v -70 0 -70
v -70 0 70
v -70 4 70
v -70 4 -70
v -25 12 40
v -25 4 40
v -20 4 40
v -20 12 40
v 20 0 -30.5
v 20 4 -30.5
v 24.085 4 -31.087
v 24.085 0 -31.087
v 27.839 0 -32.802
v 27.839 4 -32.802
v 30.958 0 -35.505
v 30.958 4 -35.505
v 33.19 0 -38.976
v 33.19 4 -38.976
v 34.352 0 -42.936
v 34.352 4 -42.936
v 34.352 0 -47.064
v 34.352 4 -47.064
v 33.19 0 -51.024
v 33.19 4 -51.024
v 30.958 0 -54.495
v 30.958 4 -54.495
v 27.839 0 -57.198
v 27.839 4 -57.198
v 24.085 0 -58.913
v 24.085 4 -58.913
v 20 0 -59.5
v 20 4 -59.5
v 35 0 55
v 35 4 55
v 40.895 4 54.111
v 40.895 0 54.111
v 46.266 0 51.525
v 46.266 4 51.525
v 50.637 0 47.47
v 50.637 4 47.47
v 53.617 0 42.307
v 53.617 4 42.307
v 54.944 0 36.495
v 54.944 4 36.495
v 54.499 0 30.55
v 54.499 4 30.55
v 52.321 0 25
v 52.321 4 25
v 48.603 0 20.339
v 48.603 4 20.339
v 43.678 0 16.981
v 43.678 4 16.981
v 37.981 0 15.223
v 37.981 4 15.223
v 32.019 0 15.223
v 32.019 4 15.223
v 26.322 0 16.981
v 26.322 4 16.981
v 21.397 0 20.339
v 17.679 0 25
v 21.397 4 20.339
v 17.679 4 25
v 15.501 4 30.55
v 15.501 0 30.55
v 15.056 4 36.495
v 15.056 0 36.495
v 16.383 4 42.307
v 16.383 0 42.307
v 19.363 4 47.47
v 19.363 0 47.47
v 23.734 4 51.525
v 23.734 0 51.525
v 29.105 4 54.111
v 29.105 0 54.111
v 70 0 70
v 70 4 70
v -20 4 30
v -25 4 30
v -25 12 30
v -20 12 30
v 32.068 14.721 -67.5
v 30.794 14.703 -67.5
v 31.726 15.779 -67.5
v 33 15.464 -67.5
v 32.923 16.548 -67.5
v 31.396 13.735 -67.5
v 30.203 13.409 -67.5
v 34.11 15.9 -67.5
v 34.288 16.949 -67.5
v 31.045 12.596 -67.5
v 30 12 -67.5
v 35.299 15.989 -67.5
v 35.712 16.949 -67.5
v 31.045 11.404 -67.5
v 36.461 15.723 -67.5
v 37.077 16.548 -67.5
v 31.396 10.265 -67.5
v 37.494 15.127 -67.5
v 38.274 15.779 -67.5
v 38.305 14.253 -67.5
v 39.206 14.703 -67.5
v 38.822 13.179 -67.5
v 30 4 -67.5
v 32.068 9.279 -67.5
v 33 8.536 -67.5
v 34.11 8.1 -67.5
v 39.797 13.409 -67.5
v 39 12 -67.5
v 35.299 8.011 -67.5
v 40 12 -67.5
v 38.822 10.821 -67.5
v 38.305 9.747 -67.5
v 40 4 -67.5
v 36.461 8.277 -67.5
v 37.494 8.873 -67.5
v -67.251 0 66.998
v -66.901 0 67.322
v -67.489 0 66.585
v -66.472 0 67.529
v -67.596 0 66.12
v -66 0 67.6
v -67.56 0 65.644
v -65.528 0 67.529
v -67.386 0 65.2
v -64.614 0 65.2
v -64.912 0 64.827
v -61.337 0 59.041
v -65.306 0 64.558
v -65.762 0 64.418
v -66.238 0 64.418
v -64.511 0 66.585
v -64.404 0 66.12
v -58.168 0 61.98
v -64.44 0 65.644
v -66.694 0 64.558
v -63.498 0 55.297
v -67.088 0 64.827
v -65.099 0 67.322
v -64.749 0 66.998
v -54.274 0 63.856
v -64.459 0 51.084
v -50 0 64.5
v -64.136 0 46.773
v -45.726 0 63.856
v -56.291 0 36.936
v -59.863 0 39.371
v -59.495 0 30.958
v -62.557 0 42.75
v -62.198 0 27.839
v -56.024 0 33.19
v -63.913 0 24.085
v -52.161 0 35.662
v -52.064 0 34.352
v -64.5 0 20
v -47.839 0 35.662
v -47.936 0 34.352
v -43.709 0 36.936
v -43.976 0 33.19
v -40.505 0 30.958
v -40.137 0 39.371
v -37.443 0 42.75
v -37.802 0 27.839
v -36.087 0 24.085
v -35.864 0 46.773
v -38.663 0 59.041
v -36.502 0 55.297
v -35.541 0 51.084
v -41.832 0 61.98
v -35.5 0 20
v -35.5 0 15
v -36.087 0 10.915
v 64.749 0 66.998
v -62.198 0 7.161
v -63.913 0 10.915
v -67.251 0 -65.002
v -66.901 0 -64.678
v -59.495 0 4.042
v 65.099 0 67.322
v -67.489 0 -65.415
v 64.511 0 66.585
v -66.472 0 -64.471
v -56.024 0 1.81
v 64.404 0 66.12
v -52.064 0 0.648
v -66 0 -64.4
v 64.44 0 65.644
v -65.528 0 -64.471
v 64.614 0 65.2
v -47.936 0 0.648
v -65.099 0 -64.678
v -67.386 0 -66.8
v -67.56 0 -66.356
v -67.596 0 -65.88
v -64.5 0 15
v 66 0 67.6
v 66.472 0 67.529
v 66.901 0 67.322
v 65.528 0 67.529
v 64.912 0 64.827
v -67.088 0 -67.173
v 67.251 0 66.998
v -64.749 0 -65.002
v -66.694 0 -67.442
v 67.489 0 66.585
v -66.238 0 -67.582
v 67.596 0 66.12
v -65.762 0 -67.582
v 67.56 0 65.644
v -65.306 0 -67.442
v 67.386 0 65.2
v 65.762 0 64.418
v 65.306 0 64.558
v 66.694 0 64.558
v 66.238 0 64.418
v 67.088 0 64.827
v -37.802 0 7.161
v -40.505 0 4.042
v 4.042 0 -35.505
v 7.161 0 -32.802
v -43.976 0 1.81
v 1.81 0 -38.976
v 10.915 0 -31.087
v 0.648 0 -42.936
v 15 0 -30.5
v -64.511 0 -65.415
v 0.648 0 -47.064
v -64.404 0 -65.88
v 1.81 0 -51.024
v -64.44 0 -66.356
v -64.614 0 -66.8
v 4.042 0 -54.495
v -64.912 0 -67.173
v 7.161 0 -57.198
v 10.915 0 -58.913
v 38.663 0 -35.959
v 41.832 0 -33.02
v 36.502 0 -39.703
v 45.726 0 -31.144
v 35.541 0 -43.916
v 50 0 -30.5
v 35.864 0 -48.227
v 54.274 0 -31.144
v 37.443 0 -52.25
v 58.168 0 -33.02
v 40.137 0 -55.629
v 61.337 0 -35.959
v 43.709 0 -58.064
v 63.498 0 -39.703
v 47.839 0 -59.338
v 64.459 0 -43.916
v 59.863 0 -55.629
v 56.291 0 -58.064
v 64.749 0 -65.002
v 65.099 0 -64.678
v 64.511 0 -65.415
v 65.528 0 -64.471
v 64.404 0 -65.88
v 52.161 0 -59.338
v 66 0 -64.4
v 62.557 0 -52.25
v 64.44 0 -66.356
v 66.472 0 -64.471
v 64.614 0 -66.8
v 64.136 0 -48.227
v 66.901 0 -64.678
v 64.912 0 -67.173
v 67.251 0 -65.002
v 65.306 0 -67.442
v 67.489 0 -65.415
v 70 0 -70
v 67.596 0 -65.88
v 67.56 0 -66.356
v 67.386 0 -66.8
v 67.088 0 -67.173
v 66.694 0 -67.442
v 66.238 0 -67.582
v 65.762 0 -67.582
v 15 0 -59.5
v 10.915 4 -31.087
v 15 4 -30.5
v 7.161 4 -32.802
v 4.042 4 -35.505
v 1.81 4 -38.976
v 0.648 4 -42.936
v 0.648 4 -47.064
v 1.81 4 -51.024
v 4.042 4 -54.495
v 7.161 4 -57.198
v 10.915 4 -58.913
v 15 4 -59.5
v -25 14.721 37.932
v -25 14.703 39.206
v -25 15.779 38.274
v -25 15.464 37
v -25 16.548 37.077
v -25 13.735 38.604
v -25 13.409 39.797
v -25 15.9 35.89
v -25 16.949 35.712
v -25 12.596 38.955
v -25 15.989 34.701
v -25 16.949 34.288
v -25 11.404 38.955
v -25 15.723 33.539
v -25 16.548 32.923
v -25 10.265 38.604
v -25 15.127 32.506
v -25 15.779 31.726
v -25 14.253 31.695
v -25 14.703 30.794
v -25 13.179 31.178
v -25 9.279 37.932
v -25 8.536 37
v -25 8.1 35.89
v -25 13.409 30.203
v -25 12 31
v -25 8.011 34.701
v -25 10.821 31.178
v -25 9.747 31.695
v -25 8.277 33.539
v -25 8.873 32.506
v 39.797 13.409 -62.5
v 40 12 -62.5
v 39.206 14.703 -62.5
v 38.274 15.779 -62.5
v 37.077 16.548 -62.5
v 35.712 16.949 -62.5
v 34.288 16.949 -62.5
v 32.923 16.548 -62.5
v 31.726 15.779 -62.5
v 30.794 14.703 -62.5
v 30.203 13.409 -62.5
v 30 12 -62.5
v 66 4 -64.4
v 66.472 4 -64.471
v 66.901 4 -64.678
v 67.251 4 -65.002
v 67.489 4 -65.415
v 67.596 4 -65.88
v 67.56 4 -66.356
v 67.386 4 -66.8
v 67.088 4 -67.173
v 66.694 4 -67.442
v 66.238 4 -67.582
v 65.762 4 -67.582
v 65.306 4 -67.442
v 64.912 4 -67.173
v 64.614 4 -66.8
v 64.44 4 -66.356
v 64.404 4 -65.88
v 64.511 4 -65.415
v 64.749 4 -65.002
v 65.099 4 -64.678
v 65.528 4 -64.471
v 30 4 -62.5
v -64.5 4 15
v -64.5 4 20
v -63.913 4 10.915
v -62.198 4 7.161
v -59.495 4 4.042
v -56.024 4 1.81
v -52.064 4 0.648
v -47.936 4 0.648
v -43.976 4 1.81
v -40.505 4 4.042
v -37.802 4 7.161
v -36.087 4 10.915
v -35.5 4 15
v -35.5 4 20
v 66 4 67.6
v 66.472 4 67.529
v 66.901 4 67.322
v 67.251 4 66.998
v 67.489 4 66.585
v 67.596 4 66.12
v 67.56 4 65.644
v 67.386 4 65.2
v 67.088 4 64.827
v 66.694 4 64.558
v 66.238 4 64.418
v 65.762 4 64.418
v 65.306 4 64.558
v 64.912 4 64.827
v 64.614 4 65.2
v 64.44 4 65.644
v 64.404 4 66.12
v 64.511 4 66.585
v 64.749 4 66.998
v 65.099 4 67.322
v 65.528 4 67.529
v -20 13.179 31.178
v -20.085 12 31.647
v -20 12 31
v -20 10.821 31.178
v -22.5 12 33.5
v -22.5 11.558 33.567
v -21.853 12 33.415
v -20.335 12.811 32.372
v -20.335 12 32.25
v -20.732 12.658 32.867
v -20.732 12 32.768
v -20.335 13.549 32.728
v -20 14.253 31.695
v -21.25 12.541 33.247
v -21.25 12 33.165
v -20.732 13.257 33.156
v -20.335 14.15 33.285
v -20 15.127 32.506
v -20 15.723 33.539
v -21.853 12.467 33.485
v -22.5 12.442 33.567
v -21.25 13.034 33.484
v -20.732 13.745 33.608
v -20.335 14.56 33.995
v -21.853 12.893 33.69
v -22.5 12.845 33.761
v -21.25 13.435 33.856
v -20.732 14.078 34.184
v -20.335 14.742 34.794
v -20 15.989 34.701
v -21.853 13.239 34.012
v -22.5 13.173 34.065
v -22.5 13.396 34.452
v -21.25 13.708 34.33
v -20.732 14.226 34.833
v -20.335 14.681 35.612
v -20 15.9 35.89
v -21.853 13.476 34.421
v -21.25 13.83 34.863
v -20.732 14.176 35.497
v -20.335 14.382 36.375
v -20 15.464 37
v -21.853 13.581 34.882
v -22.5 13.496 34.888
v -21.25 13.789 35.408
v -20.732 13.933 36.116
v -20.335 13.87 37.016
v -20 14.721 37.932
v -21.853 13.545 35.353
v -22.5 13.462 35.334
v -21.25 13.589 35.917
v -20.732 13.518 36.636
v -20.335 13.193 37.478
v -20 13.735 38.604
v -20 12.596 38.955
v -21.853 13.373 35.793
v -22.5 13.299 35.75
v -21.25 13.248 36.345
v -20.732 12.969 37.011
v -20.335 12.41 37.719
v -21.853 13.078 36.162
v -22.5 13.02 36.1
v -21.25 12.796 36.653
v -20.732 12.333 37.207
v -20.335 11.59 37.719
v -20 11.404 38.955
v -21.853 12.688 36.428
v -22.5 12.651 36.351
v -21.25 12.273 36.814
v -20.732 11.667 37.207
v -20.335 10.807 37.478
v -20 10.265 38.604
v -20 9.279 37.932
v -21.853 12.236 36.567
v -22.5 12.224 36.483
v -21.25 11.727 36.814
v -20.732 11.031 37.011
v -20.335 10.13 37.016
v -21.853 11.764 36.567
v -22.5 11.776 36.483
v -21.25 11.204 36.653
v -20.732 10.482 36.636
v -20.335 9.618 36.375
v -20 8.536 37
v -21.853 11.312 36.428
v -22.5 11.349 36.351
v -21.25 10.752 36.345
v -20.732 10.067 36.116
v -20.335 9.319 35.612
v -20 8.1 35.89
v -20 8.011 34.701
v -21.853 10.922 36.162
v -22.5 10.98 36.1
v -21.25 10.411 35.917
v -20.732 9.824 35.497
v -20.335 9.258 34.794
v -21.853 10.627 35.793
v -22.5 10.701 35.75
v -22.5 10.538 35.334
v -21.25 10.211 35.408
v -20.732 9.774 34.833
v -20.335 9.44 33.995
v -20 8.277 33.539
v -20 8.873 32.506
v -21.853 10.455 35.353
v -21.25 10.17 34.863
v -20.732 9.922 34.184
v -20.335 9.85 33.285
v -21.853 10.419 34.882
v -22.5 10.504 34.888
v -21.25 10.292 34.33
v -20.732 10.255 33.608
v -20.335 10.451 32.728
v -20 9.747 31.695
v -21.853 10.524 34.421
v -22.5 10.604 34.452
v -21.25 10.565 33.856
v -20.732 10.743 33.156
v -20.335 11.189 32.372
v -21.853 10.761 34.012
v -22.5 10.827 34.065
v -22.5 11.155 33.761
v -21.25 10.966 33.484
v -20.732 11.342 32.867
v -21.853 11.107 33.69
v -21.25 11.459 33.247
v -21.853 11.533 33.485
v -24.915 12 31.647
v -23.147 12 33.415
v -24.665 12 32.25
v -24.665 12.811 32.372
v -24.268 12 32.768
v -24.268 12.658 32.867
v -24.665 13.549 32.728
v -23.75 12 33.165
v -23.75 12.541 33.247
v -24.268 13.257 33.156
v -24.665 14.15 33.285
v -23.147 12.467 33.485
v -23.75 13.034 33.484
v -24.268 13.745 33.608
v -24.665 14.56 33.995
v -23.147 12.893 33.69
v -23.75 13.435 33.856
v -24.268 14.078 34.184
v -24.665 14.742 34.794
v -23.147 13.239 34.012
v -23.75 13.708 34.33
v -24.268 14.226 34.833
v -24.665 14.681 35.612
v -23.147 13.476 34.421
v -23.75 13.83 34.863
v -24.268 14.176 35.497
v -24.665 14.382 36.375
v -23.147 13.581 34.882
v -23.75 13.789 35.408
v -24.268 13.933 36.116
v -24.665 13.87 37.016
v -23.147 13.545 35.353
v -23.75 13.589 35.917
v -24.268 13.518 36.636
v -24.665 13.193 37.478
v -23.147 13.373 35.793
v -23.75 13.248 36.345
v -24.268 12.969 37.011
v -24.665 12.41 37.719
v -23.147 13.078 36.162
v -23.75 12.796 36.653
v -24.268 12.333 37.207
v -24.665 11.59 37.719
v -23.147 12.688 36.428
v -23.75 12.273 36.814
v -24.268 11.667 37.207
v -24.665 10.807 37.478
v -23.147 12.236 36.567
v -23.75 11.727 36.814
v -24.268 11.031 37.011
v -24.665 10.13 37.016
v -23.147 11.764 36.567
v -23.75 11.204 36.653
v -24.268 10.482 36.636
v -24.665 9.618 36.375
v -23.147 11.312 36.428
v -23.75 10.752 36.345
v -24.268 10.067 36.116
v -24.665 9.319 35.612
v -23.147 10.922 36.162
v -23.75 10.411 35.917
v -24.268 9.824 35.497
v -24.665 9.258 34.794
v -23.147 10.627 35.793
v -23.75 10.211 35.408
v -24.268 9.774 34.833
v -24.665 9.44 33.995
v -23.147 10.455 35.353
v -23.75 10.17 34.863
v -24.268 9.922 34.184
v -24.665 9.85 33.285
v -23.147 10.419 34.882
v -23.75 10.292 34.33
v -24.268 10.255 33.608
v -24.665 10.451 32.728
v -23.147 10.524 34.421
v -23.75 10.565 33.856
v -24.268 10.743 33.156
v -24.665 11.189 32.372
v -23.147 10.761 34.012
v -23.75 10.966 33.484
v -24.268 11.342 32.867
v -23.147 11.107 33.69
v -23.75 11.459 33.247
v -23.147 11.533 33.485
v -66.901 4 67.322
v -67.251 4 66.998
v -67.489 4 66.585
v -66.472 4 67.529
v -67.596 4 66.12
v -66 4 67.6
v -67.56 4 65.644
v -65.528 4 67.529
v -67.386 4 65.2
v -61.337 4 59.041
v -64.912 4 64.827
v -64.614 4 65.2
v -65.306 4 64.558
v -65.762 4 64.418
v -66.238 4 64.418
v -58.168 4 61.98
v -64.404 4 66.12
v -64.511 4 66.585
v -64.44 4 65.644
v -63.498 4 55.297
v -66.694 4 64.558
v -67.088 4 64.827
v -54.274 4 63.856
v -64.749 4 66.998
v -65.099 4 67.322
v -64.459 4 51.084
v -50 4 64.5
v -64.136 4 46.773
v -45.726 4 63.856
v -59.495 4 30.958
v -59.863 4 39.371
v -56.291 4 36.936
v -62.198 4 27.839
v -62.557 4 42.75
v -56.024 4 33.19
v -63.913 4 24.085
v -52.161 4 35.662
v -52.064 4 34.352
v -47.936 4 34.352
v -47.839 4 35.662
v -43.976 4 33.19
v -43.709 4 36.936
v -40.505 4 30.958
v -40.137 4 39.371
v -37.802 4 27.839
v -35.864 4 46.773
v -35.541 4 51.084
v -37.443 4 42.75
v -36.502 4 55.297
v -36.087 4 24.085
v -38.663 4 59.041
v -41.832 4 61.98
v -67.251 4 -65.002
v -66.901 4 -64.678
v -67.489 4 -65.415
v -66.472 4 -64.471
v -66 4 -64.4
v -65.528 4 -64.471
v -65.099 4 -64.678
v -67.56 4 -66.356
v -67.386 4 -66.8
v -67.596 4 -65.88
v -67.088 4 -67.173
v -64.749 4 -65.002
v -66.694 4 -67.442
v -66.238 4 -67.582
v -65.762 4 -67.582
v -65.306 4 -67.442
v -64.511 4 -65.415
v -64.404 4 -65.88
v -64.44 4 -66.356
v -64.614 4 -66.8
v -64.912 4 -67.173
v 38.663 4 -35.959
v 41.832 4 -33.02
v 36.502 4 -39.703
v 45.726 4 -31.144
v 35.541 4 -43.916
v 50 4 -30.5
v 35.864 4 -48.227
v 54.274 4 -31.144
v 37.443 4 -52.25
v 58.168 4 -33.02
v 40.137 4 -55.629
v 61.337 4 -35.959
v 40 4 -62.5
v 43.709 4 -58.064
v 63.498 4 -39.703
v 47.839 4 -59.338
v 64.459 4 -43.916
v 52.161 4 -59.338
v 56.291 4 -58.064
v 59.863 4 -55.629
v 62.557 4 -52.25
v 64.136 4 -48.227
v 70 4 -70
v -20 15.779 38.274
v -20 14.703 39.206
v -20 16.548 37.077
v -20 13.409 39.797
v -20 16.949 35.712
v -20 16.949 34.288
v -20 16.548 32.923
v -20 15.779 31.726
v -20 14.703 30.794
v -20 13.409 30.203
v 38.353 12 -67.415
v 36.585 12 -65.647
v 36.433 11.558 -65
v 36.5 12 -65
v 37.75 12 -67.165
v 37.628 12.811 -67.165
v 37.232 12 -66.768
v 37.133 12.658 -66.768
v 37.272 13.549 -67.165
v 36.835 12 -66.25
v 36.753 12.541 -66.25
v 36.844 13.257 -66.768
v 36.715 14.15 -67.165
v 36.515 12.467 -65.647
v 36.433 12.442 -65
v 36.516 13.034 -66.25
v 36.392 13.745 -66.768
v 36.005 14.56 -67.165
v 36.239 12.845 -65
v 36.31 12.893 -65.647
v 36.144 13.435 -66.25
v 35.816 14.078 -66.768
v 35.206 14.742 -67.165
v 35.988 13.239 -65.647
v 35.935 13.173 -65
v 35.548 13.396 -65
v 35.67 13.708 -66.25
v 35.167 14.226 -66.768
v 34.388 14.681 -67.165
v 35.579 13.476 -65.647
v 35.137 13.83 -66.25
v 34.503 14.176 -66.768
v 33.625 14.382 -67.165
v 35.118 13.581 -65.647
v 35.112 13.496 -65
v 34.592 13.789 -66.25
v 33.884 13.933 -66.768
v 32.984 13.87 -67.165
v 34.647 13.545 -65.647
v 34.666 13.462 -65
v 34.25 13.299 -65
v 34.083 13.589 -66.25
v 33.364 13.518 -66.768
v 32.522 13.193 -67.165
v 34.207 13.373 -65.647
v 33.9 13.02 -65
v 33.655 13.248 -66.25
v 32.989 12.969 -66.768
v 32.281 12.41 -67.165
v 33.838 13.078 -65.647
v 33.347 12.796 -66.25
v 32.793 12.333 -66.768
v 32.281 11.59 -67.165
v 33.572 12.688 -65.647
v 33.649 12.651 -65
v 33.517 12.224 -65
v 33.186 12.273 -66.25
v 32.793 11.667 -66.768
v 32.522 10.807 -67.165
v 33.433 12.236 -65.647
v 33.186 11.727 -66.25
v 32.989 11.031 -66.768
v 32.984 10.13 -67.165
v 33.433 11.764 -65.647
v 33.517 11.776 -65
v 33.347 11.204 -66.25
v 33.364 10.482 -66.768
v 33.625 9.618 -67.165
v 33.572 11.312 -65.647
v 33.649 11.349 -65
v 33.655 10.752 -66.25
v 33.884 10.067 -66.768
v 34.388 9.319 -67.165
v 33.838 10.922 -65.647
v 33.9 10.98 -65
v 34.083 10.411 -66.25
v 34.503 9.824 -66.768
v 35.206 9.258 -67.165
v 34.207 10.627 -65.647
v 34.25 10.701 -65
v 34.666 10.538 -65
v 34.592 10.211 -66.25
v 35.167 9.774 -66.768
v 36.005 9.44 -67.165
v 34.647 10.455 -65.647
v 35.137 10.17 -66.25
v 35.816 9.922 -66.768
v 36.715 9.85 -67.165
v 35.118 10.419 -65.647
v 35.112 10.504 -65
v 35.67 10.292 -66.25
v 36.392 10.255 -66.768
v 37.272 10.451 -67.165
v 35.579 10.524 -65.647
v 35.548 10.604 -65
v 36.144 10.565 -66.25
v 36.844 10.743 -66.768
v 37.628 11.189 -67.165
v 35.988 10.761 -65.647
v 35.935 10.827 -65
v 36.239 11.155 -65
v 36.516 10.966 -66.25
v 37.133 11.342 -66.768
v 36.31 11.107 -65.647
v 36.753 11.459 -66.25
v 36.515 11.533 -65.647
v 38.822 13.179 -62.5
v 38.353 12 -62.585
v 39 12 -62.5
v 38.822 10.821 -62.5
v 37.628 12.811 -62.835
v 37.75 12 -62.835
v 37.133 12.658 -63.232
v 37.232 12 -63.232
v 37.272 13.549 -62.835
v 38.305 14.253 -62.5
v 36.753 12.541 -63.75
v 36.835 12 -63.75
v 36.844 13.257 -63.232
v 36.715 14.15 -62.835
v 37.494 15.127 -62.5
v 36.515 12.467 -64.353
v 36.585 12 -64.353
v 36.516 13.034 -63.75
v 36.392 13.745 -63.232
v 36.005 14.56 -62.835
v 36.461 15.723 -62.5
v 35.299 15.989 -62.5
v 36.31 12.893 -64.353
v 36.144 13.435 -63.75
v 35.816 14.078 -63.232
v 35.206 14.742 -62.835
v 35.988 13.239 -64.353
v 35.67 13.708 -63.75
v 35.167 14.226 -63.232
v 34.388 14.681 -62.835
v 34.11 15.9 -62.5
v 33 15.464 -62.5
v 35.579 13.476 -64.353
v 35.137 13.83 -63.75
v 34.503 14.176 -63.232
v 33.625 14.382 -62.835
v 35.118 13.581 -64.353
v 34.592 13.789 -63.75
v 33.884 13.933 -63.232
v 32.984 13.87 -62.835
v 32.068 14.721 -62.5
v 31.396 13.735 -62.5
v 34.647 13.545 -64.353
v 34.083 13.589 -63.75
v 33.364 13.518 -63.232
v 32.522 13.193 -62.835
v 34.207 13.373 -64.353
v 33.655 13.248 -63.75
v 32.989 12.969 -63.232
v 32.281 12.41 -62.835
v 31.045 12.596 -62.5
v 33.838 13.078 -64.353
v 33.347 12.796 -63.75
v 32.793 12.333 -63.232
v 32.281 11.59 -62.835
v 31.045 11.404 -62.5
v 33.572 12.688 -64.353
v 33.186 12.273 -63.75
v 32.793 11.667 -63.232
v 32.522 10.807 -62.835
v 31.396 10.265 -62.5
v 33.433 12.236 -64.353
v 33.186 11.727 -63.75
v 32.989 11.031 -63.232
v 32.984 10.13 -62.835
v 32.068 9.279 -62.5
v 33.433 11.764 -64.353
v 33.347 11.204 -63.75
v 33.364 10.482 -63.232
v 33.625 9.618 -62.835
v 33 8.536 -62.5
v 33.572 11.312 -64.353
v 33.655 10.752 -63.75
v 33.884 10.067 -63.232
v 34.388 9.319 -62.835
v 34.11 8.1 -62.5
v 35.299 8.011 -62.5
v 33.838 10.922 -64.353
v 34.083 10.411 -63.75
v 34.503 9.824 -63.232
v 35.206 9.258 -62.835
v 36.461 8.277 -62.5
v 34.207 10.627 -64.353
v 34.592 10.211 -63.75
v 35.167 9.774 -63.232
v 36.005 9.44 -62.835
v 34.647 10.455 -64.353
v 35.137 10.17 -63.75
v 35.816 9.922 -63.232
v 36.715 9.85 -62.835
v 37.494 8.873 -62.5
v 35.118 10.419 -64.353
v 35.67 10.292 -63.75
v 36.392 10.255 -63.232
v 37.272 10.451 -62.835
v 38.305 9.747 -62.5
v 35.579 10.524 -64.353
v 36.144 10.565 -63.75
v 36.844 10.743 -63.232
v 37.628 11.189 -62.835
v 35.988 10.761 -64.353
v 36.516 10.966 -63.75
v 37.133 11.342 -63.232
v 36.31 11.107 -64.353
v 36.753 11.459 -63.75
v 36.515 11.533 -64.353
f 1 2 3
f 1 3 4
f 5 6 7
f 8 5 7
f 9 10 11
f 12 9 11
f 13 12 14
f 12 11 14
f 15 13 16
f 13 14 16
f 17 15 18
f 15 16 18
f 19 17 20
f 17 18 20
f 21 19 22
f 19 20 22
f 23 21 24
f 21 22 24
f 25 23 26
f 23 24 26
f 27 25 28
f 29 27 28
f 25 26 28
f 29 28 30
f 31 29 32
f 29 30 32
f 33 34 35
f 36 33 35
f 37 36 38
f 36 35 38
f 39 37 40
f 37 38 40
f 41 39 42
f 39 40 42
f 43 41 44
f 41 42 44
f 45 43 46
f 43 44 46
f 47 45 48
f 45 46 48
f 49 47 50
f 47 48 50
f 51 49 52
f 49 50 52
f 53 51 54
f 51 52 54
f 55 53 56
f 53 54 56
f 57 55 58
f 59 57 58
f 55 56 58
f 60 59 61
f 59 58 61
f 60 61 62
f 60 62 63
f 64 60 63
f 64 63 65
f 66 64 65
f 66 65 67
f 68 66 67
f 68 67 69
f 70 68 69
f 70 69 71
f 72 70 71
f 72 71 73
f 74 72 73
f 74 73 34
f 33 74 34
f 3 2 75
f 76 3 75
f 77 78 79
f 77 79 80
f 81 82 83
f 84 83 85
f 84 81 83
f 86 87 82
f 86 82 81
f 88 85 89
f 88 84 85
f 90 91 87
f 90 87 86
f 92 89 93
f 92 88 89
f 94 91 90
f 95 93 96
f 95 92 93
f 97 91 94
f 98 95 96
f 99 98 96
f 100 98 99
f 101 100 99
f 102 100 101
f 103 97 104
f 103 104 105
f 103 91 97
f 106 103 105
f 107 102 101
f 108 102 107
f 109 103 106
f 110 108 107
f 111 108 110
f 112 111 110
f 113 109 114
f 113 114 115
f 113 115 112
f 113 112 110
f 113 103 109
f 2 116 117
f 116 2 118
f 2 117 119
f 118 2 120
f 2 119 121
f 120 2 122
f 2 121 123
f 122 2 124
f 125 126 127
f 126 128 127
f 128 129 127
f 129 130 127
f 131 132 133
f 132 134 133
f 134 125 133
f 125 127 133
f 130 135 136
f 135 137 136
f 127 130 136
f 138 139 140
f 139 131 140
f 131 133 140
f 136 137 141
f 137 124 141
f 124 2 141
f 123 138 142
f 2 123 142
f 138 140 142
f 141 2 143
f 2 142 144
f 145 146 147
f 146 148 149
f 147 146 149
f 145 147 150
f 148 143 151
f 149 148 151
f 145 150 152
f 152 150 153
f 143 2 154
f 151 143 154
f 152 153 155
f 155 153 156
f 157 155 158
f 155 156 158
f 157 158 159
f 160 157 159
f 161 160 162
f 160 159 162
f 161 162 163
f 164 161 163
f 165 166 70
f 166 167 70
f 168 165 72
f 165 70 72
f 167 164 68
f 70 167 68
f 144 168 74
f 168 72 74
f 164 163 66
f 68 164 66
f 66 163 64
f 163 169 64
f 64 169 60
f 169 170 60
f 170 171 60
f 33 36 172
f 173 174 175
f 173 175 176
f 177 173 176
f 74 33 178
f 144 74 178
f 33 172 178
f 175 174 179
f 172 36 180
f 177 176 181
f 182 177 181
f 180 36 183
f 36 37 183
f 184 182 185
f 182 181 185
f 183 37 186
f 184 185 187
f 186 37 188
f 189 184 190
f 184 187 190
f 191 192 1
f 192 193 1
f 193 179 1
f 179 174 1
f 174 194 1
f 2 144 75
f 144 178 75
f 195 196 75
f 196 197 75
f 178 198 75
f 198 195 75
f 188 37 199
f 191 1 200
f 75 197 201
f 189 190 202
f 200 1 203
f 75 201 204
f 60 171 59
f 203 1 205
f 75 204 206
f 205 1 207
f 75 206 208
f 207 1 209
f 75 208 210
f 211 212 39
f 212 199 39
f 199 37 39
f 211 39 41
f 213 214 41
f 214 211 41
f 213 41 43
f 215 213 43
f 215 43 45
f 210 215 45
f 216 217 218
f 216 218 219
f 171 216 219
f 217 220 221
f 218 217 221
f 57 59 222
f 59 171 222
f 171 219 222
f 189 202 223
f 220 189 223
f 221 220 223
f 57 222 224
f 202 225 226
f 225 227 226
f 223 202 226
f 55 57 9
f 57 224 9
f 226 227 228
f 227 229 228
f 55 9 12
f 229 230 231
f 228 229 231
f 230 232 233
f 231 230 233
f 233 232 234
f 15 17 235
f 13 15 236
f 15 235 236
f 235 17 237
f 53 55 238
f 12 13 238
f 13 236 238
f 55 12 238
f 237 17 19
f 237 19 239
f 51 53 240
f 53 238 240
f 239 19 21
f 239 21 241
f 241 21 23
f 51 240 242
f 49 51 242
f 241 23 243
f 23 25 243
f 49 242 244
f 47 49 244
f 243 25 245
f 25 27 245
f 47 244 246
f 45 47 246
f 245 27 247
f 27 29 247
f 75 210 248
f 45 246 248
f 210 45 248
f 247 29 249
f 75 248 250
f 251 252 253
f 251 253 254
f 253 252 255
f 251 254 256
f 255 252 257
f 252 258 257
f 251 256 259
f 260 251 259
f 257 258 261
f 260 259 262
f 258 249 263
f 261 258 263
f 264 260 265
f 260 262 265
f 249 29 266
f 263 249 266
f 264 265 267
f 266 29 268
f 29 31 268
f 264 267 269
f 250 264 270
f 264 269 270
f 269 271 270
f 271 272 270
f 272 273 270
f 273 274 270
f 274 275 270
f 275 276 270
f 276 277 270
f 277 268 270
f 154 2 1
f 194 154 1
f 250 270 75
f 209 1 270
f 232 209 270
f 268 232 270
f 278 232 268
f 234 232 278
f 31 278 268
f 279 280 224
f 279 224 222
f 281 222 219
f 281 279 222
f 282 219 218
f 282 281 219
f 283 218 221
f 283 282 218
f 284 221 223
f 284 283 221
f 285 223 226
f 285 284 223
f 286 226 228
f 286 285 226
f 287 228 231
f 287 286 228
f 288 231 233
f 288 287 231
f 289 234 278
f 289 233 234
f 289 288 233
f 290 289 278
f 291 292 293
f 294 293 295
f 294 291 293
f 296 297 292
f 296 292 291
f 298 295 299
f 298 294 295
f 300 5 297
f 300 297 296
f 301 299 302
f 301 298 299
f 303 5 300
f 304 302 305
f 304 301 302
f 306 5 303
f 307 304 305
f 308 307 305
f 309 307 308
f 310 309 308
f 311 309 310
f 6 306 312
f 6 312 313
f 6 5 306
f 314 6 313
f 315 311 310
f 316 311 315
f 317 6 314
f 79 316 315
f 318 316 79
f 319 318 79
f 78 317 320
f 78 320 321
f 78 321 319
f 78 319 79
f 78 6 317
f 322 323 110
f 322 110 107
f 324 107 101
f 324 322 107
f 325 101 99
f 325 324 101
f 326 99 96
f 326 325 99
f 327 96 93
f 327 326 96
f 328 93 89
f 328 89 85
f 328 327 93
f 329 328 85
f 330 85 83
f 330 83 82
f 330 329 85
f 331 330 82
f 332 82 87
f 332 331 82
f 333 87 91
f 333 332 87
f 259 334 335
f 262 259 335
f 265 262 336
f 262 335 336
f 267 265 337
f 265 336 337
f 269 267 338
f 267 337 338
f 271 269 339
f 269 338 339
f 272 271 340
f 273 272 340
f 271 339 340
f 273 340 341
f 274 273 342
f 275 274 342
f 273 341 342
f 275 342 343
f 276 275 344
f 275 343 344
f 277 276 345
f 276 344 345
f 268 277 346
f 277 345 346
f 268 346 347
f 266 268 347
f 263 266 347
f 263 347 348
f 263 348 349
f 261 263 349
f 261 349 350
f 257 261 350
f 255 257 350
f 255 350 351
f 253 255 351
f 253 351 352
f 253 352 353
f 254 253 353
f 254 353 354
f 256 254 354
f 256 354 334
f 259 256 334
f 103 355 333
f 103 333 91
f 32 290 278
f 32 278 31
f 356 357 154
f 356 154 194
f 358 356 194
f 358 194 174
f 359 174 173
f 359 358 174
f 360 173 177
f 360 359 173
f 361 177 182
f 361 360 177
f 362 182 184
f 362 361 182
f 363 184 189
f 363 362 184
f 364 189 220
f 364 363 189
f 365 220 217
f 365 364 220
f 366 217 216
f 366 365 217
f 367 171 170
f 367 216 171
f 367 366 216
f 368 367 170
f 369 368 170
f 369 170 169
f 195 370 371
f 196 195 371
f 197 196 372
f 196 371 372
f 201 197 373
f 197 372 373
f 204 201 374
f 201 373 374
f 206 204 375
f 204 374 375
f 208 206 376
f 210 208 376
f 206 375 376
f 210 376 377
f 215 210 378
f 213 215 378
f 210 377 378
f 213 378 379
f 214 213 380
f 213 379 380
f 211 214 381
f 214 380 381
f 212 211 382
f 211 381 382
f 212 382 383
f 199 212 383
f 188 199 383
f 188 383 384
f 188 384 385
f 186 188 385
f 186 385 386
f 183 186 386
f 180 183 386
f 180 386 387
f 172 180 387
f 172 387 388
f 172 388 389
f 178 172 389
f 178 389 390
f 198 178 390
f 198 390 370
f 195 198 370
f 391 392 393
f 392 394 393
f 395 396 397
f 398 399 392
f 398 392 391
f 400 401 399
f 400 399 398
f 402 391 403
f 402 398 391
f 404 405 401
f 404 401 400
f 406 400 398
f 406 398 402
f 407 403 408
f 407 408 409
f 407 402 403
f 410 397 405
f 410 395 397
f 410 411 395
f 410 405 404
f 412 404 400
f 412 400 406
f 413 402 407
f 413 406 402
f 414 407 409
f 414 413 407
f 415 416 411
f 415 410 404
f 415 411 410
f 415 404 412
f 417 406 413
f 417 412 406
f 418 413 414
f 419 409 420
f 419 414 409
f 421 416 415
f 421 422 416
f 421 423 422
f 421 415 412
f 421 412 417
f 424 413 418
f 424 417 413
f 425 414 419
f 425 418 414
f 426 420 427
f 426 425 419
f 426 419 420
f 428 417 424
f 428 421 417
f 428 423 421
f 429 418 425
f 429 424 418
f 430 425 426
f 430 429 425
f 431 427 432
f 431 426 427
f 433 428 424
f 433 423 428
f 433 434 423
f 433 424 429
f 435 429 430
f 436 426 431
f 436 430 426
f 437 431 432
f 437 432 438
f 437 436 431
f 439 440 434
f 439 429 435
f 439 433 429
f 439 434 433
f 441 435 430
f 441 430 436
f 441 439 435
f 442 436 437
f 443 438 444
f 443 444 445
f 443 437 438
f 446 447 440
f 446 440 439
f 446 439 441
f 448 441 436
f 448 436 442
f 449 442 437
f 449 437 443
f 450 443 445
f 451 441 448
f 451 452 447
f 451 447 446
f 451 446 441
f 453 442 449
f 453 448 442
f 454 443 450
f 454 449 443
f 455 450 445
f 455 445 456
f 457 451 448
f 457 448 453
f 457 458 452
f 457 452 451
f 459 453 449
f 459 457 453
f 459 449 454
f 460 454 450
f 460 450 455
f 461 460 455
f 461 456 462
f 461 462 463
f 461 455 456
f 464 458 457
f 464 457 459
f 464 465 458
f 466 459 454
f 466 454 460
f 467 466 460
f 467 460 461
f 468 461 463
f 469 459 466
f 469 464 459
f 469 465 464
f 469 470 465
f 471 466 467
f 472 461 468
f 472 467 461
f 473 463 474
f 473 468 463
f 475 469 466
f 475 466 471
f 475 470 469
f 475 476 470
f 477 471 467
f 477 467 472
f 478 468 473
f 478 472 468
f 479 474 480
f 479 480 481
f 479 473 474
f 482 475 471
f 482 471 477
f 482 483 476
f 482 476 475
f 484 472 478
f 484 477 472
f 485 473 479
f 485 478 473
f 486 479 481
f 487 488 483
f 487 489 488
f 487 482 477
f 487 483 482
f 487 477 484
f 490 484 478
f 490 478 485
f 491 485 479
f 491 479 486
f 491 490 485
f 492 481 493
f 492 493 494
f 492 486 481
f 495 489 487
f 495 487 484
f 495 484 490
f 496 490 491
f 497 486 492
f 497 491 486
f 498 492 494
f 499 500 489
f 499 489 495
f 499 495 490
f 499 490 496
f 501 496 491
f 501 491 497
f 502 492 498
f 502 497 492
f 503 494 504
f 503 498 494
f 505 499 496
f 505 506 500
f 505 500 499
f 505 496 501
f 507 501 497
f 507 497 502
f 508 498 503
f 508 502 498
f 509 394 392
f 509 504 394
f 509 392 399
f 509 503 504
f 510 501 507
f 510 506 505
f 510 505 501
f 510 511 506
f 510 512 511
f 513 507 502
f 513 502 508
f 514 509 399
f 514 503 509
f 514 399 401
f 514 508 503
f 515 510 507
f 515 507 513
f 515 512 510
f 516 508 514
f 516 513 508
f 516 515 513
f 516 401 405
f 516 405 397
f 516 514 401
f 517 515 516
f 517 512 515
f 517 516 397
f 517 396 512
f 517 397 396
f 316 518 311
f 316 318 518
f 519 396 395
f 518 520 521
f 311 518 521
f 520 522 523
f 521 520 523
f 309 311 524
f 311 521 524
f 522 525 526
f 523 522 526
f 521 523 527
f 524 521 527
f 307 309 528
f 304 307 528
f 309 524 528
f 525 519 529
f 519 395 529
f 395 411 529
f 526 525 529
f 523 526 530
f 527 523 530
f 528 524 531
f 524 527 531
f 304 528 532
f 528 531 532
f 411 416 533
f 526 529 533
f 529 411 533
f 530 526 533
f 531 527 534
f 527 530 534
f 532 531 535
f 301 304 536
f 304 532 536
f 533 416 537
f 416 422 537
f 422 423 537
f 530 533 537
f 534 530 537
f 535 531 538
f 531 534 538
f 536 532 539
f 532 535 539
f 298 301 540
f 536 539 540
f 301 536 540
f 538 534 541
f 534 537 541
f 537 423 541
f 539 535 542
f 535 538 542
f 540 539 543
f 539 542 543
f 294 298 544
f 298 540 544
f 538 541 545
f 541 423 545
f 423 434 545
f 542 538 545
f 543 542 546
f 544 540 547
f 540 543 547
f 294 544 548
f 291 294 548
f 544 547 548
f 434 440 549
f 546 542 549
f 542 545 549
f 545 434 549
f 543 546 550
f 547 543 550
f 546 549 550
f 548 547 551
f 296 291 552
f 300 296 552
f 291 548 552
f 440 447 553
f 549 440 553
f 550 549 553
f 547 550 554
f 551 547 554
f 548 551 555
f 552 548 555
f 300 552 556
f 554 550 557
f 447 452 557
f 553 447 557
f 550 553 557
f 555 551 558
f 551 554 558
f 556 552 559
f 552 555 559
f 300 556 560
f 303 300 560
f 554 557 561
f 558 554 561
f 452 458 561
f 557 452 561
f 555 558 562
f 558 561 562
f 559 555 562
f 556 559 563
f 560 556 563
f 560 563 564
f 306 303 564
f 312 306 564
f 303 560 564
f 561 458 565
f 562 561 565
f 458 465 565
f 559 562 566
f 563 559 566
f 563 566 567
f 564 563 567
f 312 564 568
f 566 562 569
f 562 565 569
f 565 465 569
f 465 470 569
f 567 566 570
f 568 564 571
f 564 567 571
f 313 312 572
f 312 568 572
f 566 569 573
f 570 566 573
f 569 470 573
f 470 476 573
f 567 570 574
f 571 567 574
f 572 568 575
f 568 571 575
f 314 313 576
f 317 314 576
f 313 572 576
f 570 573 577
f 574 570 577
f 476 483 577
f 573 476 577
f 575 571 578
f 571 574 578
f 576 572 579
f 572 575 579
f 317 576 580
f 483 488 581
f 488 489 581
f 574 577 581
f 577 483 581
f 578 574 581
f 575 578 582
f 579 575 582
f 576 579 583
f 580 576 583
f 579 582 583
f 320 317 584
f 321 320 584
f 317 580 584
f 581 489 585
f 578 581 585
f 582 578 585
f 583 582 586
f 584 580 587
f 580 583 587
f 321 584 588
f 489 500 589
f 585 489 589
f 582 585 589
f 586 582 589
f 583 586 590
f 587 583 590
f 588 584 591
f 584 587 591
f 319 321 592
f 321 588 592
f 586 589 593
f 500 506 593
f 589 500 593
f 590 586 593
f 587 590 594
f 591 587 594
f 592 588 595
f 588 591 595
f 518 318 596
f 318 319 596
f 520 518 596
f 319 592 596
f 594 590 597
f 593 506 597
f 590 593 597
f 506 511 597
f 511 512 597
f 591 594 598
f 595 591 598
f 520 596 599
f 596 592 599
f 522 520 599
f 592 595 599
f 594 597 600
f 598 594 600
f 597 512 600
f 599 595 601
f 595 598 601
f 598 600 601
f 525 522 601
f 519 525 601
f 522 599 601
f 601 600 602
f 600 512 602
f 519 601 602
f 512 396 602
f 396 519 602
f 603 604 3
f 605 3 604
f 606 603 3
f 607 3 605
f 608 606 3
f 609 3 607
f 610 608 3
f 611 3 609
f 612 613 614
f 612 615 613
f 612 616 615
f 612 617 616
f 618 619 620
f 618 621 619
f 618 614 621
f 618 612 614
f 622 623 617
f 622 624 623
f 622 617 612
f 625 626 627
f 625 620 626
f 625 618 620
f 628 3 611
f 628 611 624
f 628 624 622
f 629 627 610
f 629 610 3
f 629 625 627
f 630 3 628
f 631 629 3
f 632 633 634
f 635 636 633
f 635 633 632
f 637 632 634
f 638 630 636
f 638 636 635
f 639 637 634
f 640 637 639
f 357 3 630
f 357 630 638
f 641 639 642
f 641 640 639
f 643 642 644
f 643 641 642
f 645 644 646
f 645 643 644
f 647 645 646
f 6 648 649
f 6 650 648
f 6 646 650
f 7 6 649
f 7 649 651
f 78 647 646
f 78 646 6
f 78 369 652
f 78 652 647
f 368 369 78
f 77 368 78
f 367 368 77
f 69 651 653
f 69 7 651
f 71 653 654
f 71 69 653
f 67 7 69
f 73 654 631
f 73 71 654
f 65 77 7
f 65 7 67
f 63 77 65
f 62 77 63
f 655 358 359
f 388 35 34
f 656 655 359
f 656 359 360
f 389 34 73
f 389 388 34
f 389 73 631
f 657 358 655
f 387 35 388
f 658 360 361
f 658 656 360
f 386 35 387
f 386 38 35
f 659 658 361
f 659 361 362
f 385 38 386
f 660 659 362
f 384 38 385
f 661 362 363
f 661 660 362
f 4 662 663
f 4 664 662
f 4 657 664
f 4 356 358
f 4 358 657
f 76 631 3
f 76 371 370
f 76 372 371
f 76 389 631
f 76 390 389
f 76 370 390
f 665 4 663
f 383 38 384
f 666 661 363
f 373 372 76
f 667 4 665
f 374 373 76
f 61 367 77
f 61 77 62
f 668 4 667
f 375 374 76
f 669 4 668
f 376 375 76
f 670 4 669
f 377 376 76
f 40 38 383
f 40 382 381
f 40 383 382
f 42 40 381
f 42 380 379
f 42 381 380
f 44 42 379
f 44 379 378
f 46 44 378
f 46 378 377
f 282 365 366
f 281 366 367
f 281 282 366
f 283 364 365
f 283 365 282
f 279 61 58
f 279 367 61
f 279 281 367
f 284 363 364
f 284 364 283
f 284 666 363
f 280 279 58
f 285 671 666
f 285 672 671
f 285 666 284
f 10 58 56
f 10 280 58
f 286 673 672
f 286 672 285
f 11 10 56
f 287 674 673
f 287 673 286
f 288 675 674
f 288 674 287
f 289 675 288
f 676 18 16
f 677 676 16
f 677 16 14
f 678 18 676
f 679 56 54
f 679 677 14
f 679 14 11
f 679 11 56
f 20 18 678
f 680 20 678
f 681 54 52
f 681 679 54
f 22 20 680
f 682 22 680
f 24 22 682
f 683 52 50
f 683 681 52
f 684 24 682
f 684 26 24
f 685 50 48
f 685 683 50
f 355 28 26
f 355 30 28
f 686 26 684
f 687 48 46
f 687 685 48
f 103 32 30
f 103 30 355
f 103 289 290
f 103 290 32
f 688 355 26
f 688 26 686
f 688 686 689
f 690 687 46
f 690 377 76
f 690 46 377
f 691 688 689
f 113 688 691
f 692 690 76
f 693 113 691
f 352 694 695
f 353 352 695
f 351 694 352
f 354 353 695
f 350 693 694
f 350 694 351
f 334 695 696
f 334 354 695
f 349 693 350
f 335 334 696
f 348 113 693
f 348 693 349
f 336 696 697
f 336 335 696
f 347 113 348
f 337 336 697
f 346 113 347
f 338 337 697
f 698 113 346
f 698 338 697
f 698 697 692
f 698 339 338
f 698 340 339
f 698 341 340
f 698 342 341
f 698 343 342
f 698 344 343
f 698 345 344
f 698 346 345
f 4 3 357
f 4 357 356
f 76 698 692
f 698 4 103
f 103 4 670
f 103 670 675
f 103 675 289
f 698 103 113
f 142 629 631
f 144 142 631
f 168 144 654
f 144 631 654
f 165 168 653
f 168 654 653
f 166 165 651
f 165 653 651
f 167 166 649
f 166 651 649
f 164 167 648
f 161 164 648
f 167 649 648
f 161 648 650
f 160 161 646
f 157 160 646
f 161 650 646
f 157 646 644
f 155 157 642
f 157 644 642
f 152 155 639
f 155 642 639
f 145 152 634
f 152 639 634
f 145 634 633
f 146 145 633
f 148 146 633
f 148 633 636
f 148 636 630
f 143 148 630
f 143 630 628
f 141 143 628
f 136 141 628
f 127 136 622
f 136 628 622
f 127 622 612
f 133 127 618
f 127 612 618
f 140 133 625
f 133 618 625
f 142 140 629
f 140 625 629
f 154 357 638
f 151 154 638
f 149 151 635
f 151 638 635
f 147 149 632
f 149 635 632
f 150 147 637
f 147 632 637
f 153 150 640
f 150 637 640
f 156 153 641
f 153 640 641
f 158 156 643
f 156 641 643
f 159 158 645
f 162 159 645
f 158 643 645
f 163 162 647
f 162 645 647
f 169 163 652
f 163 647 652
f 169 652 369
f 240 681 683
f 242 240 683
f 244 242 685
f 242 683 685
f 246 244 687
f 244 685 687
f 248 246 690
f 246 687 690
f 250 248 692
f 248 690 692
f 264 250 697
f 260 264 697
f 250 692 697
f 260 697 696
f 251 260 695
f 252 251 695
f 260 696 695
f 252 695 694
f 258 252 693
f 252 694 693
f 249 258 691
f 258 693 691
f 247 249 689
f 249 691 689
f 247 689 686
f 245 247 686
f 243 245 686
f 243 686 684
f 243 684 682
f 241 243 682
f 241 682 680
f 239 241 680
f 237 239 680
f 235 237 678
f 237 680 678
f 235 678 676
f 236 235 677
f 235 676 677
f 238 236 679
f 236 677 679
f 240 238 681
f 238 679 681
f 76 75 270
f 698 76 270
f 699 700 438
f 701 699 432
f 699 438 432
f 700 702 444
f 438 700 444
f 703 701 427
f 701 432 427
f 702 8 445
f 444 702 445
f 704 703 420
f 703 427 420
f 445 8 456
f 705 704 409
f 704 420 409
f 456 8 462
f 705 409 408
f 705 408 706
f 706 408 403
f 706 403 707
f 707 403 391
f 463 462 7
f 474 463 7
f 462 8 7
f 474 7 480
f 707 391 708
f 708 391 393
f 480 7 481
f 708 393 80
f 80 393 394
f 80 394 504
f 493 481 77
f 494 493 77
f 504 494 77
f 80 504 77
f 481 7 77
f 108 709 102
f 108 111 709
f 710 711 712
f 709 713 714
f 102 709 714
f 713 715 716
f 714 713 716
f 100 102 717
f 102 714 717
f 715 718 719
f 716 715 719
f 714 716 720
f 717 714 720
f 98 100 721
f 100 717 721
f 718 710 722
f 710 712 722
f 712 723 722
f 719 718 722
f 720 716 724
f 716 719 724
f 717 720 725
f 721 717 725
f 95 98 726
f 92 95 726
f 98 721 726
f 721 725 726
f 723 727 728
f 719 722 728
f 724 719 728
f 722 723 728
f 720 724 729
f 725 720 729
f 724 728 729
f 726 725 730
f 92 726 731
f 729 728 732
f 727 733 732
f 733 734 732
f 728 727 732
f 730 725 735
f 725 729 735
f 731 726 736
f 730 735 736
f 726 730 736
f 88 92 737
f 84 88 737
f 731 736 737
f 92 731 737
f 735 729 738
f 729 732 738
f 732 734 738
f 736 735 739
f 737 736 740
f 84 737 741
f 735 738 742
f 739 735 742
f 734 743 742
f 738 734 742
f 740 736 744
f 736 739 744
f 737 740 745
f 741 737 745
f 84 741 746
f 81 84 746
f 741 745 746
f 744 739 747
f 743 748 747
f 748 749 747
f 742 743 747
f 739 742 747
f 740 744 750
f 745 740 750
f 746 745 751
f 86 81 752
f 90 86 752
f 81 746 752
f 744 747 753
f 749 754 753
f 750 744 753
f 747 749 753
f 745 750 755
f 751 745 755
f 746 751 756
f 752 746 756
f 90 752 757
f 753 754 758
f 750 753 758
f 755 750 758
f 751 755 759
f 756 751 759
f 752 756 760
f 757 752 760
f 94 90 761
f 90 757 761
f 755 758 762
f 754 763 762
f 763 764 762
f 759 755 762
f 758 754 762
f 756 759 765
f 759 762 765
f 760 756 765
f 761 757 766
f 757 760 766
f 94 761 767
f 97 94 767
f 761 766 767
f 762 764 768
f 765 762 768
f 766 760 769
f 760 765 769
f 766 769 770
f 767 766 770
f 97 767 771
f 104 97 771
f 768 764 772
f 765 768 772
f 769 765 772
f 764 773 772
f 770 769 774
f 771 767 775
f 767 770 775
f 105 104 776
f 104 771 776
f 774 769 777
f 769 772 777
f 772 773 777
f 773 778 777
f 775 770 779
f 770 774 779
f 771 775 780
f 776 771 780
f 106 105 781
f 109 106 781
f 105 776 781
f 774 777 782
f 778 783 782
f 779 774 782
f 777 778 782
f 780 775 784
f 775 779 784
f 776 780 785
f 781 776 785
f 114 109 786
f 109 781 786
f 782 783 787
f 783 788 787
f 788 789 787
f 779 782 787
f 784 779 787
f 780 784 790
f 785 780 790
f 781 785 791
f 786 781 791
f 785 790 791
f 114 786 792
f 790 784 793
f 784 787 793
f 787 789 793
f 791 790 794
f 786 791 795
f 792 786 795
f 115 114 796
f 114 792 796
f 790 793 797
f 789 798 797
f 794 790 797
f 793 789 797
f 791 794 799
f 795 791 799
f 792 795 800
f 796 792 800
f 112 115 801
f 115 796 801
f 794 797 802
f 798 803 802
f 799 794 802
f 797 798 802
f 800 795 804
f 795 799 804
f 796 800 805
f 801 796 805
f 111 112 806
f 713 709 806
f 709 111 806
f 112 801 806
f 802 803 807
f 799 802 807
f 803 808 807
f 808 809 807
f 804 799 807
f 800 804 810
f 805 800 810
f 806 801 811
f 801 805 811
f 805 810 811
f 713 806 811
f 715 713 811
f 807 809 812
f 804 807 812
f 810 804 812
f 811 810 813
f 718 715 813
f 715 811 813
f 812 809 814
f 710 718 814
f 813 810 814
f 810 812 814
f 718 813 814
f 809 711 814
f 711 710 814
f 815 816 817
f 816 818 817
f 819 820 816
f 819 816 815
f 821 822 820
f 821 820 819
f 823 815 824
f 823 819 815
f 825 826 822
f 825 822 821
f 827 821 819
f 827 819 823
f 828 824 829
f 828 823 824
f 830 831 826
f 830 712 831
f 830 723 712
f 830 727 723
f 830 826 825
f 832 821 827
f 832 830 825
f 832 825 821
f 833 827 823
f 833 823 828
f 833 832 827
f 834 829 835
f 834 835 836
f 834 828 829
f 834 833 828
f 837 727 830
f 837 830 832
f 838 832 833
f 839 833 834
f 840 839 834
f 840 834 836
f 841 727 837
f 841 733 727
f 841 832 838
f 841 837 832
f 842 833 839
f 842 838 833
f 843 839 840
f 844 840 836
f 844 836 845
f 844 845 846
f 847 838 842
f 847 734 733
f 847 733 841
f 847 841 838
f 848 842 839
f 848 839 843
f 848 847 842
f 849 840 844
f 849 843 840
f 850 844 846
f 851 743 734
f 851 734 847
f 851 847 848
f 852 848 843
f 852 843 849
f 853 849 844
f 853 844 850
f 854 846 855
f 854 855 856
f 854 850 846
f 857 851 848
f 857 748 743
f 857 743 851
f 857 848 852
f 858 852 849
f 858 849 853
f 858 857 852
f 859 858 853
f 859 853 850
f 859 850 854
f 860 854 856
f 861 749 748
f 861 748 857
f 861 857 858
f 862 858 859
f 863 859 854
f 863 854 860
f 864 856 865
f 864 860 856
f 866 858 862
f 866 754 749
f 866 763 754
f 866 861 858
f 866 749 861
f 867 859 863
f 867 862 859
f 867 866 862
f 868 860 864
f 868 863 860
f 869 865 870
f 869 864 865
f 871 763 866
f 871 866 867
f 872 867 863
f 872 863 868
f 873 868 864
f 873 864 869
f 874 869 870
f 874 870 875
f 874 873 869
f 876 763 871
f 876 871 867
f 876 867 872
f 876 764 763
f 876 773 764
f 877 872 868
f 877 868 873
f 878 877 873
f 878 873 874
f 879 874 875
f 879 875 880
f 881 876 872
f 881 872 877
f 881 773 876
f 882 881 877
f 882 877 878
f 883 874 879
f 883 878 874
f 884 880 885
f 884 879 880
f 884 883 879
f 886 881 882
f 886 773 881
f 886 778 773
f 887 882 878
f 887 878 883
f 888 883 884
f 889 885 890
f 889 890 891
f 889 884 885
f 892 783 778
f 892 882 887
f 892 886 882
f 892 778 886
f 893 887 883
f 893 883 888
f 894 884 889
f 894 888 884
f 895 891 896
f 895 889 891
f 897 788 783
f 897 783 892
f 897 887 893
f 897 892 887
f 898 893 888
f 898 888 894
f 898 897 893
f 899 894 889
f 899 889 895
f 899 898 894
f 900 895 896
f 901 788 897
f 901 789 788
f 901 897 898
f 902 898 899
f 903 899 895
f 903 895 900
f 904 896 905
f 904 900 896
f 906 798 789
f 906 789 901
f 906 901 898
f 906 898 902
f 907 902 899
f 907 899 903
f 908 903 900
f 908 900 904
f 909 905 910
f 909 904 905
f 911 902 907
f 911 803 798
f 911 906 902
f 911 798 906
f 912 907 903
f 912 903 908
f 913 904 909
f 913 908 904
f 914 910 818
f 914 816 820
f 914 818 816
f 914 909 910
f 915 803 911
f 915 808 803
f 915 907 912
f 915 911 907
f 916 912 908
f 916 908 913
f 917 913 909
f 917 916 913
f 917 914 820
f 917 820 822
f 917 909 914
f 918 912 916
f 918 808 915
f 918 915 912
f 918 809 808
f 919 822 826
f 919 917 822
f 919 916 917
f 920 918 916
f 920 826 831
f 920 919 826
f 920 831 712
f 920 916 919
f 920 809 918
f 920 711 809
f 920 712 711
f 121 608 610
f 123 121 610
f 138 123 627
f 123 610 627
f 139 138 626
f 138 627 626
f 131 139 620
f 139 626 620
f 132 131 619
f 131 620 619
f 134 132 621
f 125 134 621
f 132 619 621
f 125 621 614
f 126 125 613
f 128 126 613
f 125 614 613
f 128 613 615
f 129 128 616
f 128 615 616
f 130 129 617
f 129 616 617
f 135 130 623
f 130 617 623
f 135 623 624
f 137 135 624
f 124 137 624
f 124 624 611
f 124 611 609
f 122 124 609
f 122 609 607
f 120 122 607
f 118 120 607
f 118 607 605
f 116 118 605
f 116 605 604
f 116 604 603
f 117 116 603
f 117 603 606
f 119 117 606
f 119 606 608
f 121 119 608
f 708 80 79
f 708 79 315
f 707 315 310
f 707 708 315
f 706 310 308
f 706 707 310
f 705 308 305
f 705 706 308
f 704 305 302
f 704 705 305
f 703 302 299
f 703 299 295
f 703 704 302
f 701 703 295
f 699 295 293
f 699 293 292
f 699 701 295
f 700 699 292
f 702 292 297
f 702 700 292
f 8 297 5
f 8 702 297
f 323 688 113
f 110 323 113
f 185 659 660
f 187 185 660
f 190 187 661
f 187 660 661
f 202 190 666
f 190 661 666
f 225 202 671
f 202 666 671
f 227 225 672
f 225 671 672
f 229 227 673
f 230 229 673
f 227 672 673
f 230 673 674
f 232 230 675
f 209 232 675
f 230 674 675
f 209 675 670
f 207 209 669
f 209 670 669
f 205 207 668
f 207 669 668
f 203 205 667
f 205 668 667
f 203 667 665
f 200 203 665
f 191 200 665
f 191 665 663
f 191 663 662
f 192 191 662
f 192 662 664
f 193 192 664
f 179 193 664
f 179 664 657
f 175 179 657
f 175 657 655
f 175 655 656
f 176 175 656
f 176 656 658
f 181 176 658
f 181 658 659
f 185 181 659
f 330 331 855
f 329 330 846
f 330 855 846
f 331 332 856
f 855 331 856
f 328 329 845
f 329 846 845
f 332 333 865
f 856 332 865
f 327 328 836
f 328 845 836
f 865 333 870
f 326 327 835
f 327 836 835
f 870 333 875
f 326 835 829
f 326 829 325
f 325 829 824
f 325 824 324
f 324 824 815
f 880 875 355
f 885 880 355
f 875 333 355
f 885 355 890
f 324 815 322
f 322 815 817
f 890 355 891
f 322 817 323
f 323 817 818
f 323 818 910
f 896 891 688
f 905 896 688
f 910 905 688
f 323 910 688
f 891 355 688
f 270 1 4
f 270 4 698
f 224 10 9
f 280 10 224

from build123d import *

# Parameters (mm, degrees)
SKETCH1_W           = 140
SKETCH1_H           = 140
BOSS_EXTRUDE1_DEPTH = 4
SKETCH2_R           = 14.5
CUT_EXTRUDE1_DEPTH  = 4
SKETCH3_R           = 20
CUT_EXTRUDE2_DEPTH  = 10
SKETCH5_R           = 1.6
CUT_EXTRUDE5_DEPTH  = 10
CUT_EXTRUDE6_DEPTH  = 10
SKETCH8_W           = 5
SKETCH8_H           = 10
SKETCH8_W_2         = 10
SKETCH8_H_2         = 5
BOSS_EXTRUDE2_DEPTH = 14
SKETCH9_R           = 1.5
CUT_EXTRUDE7_DEPTH  = 151.931275752
SKETCH10_R          = 1.5
CUT_EXTRUDE8_DEPTH  = 5
FILLET1_R           = 2.5


with BuildPart() as part:
    # Sketch1 → Boss-Extrude1 (new body)
    with BuildSketch(Plane(origin=(0, 0, 0), x_dir=(1, 0, 0), z_dir=(0, 1, 0))):
        Rectangle(SKETCH1_W, SKETCH1_H)
    extrude(amount=BOSS_EXTRUDE1_DEPTH)

    # Sketch2 → Cut-Extrude1 (cut)
    with BuildSketch(Plane(origin=(0, 4, 0), x_dir=(1, 0, 0), z_dir=(0, 1, 0))):
        with Locations(Location((50, 45, 0), (0, 0, 270))):
            Circle(SKETCH2_R)
        with Locations(Location((20, 45, 0), (0, 0, 270))):
            Circle(SKETCH2_R)
        with Locations(Location((-50, -20, 0), (0, 0, 270))):
            Circle(SKETCH2_R)
        with Locations(Location((-50, -50, 0), (0, 0, 270))):
            Circle(SKETCH2_R)
    extrude(amount=-CUT_EXTRUDE1_DEPTH, mode=Mode.SUBTRACT)

    # Sketch3 → Cut-Extrude2 (cut)
    with BuildSketch(Plane(origin=(0, 4, 0), x_dir=(1, 0, 0), z_dir=(0, 1, 0))):
        with Locations(Location((35, -35, 0), (0, 0, 270))):
            Circle(SKETCH3_R)
    extrude(amount=-CUT_EXTRUDE2_DEPTH, mode=Mode.SUBTRACT)

    # Sketch5 → Cut-Extrude5 (cut)
    with BuildSketch(Plane(origin=(0, 4, 0), x_dir=(1, 0, 0), z_dir=(0, 1, 0))):
        with Locations(Location((-66, 66, 0), (0, 0, 270))):
            Circle(SKETCH5_R)
        with Locations(Location((66, 66, 0), (0, 0, 270))):
            Circle(SKETCH5_R)
        with Locations(Location((66, -66, 0), (0, 0, 270))):
            Circle(SKETCH5_R)
        with Locations(Location((-66, -66, 0), (0, 0, 270))):
            Circle(SKETCH5_R)
    extrude(amount=-CUT_EXTRUDE5_DEPTH, mode=Mode.SUBTRACT)

    # Sketch7 → Cut-Extrude6 (cut)
    with BuildSketch(Plane(origin=(0, 4, 0), x_dir=(1, 0, 0), z_dir=(0, 1, 0))):
        with BuildLine():
            Line((-64.5, -20), (-64.5, -15))
            ThreePointArc((-64.5, -15), (-50, -0.5), (-35.5, -15))
            Line((-35.5, -15), (-35.5, -20))
            ThreePointArc((-35.5, -20), (-50, -34.5), (-64.5, -20))
        make_face()
        with BuildLine():
            Line((20, 30.5), (15, 30.5))
            ThreePointArc((15, 30.5), (0.5, 45), (15, 59.5))
            Line((15, 59.5), (20, 59.5))
            ThreePointArc((20, 59.5), (34.5, 45), (20, 30.5))
        make_face()
    extrude(amount=-CUT_EXTRUDE6_DEPTH, mode=Mode.SUBTRACT)

    # Sketch8 → Boss-Extrude2 (add)
    with BuildSketch(Plane(origin=(0, 4, 0), x_dir=(1, 0, 0), z_dir=(0, 1, 0))):
        with Locations((-22.5, -35)):
            Rectangle(SKETCH8_W, SKETCH8_H)
        with Locations((35, 65)):
            Rectangle(SKETCH8_W_2, SKETCH8_H_2)
    extrude(amount=BOSS_EXTRUDE2_DEPTH)

    # Sketch9 → Cut-Extrude7 (cut, through all)
    with BuildSketch(Plane.XY.offset(-62.5)):
        with Locations((35, 12)):
            Circle(SKETCH9_R)
        with BuildLine():
            Line((30, 12), (30, 22.099022081))
            Line((30, 22.099022081), (40, 22.099022081))
            Line((40, 22.099022081), (40, 12))
            ThreePointArc((40, 12), (35, 17), (30, 12))
        make_face()
    extrude(amount=-CUT_EXTRUDE7_DEPTH, mode=Mode.SUBTRACT)

    # Sketch10 → Cut-Extrude8 (cut)
    with BuildSketch(Plane(origin=(-20, 0, 0), x_dir=(0, 0, -1), z_dir=(1, 0, 0))):
        with Locations((-35, 12)):
            Circle(SKETCH10_R)
        with BuildLine():
            Line((-40, 12), (-40, 23.531098802))
            Line((-40, 23.531098802), (-30, 23.531098802))
            Line((-30, 23.531098802), (-30, 12))
            ThreePointArc((-30, 12), (-35, 17), (-40, 12))
        make_face()
    extrude(amount=-CUT_EXTRUDE8_DEPTH, mode=Mode.SUBTRACT)

    # Fillet1
    fillet1_edges = [part.edges().sort_by_distance(p)[0] for p in [
        (33.5, 12, -67.5),
        (33.5, 12, -62.5),
        (-25, 12, 36.5),
        (-20, 12, 36.5),
    ]]
    fillet(fillet1_edges, radius=FILLET1_R - 0.0001)  # a hair under: the kernel refuses the full size


solid = part.part
